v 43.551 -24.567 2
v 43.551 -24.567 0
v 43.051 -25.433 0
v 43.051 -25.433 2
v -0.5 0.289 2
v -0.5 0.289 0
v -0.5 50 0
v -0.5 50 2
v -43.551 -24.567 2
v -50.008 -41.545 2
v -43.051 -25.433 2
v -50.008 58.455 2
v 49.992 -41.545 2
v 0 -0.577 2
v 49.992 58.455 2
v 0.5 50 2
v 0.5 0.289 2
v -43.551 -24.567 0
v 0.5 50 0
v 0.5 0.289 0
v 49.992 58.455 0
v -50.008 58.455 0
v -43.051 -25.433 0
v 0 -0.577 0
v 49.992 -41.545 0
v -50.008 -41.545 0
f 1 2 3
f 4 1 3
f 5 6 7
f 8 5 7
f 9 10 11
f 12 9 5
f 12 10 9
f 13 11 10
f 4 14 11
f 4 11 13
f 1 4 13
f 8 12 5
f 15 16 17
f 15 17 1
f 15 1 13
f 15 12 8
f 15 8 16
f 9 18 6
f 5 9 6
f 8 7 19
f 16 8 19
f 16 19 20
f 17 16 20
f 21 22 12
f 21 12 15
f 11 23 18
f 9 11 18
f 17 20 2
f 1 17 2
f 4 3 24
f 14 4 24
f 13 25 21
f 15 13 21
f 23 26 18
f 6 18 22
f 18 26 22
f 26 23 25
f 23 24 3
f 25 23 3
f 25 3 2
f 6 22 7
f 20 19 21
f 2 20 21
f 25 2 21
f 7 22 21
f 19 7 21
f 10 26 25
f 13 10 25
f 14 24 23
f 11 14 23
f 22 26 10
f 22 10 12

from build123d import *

# Parameters (mm, degrees)
F0_W     = 100
F0_H     = 100
F1_DEPTH = 2


with BuildPart() as f1:
    # F0 (on Top) → F1 (new body)
    with BuildSketch(Plane.XY):
        with Locations((-0.007899031, 8.455215469)):
            Rectangle(F0_W, F0_H)
        Polygon((-0.5, 50), (0, 50), (0.5, 50), (0.5, 0.2886751346), (43.5512701892, -24.5669872981), (43.3012701892, -25), (43.0512701892, -25.4330127019), (0, -0.5773502692), (-43.0512701892, -25.4330127019), (-43.3012701892, -25), (-43.5512701892, -24.5669872981), (-0.5, 0.2886751346), align=None, mode=Mode.SUBTRACT)
    extrude(amount=F1_DEPTH)


solid = f1.part
